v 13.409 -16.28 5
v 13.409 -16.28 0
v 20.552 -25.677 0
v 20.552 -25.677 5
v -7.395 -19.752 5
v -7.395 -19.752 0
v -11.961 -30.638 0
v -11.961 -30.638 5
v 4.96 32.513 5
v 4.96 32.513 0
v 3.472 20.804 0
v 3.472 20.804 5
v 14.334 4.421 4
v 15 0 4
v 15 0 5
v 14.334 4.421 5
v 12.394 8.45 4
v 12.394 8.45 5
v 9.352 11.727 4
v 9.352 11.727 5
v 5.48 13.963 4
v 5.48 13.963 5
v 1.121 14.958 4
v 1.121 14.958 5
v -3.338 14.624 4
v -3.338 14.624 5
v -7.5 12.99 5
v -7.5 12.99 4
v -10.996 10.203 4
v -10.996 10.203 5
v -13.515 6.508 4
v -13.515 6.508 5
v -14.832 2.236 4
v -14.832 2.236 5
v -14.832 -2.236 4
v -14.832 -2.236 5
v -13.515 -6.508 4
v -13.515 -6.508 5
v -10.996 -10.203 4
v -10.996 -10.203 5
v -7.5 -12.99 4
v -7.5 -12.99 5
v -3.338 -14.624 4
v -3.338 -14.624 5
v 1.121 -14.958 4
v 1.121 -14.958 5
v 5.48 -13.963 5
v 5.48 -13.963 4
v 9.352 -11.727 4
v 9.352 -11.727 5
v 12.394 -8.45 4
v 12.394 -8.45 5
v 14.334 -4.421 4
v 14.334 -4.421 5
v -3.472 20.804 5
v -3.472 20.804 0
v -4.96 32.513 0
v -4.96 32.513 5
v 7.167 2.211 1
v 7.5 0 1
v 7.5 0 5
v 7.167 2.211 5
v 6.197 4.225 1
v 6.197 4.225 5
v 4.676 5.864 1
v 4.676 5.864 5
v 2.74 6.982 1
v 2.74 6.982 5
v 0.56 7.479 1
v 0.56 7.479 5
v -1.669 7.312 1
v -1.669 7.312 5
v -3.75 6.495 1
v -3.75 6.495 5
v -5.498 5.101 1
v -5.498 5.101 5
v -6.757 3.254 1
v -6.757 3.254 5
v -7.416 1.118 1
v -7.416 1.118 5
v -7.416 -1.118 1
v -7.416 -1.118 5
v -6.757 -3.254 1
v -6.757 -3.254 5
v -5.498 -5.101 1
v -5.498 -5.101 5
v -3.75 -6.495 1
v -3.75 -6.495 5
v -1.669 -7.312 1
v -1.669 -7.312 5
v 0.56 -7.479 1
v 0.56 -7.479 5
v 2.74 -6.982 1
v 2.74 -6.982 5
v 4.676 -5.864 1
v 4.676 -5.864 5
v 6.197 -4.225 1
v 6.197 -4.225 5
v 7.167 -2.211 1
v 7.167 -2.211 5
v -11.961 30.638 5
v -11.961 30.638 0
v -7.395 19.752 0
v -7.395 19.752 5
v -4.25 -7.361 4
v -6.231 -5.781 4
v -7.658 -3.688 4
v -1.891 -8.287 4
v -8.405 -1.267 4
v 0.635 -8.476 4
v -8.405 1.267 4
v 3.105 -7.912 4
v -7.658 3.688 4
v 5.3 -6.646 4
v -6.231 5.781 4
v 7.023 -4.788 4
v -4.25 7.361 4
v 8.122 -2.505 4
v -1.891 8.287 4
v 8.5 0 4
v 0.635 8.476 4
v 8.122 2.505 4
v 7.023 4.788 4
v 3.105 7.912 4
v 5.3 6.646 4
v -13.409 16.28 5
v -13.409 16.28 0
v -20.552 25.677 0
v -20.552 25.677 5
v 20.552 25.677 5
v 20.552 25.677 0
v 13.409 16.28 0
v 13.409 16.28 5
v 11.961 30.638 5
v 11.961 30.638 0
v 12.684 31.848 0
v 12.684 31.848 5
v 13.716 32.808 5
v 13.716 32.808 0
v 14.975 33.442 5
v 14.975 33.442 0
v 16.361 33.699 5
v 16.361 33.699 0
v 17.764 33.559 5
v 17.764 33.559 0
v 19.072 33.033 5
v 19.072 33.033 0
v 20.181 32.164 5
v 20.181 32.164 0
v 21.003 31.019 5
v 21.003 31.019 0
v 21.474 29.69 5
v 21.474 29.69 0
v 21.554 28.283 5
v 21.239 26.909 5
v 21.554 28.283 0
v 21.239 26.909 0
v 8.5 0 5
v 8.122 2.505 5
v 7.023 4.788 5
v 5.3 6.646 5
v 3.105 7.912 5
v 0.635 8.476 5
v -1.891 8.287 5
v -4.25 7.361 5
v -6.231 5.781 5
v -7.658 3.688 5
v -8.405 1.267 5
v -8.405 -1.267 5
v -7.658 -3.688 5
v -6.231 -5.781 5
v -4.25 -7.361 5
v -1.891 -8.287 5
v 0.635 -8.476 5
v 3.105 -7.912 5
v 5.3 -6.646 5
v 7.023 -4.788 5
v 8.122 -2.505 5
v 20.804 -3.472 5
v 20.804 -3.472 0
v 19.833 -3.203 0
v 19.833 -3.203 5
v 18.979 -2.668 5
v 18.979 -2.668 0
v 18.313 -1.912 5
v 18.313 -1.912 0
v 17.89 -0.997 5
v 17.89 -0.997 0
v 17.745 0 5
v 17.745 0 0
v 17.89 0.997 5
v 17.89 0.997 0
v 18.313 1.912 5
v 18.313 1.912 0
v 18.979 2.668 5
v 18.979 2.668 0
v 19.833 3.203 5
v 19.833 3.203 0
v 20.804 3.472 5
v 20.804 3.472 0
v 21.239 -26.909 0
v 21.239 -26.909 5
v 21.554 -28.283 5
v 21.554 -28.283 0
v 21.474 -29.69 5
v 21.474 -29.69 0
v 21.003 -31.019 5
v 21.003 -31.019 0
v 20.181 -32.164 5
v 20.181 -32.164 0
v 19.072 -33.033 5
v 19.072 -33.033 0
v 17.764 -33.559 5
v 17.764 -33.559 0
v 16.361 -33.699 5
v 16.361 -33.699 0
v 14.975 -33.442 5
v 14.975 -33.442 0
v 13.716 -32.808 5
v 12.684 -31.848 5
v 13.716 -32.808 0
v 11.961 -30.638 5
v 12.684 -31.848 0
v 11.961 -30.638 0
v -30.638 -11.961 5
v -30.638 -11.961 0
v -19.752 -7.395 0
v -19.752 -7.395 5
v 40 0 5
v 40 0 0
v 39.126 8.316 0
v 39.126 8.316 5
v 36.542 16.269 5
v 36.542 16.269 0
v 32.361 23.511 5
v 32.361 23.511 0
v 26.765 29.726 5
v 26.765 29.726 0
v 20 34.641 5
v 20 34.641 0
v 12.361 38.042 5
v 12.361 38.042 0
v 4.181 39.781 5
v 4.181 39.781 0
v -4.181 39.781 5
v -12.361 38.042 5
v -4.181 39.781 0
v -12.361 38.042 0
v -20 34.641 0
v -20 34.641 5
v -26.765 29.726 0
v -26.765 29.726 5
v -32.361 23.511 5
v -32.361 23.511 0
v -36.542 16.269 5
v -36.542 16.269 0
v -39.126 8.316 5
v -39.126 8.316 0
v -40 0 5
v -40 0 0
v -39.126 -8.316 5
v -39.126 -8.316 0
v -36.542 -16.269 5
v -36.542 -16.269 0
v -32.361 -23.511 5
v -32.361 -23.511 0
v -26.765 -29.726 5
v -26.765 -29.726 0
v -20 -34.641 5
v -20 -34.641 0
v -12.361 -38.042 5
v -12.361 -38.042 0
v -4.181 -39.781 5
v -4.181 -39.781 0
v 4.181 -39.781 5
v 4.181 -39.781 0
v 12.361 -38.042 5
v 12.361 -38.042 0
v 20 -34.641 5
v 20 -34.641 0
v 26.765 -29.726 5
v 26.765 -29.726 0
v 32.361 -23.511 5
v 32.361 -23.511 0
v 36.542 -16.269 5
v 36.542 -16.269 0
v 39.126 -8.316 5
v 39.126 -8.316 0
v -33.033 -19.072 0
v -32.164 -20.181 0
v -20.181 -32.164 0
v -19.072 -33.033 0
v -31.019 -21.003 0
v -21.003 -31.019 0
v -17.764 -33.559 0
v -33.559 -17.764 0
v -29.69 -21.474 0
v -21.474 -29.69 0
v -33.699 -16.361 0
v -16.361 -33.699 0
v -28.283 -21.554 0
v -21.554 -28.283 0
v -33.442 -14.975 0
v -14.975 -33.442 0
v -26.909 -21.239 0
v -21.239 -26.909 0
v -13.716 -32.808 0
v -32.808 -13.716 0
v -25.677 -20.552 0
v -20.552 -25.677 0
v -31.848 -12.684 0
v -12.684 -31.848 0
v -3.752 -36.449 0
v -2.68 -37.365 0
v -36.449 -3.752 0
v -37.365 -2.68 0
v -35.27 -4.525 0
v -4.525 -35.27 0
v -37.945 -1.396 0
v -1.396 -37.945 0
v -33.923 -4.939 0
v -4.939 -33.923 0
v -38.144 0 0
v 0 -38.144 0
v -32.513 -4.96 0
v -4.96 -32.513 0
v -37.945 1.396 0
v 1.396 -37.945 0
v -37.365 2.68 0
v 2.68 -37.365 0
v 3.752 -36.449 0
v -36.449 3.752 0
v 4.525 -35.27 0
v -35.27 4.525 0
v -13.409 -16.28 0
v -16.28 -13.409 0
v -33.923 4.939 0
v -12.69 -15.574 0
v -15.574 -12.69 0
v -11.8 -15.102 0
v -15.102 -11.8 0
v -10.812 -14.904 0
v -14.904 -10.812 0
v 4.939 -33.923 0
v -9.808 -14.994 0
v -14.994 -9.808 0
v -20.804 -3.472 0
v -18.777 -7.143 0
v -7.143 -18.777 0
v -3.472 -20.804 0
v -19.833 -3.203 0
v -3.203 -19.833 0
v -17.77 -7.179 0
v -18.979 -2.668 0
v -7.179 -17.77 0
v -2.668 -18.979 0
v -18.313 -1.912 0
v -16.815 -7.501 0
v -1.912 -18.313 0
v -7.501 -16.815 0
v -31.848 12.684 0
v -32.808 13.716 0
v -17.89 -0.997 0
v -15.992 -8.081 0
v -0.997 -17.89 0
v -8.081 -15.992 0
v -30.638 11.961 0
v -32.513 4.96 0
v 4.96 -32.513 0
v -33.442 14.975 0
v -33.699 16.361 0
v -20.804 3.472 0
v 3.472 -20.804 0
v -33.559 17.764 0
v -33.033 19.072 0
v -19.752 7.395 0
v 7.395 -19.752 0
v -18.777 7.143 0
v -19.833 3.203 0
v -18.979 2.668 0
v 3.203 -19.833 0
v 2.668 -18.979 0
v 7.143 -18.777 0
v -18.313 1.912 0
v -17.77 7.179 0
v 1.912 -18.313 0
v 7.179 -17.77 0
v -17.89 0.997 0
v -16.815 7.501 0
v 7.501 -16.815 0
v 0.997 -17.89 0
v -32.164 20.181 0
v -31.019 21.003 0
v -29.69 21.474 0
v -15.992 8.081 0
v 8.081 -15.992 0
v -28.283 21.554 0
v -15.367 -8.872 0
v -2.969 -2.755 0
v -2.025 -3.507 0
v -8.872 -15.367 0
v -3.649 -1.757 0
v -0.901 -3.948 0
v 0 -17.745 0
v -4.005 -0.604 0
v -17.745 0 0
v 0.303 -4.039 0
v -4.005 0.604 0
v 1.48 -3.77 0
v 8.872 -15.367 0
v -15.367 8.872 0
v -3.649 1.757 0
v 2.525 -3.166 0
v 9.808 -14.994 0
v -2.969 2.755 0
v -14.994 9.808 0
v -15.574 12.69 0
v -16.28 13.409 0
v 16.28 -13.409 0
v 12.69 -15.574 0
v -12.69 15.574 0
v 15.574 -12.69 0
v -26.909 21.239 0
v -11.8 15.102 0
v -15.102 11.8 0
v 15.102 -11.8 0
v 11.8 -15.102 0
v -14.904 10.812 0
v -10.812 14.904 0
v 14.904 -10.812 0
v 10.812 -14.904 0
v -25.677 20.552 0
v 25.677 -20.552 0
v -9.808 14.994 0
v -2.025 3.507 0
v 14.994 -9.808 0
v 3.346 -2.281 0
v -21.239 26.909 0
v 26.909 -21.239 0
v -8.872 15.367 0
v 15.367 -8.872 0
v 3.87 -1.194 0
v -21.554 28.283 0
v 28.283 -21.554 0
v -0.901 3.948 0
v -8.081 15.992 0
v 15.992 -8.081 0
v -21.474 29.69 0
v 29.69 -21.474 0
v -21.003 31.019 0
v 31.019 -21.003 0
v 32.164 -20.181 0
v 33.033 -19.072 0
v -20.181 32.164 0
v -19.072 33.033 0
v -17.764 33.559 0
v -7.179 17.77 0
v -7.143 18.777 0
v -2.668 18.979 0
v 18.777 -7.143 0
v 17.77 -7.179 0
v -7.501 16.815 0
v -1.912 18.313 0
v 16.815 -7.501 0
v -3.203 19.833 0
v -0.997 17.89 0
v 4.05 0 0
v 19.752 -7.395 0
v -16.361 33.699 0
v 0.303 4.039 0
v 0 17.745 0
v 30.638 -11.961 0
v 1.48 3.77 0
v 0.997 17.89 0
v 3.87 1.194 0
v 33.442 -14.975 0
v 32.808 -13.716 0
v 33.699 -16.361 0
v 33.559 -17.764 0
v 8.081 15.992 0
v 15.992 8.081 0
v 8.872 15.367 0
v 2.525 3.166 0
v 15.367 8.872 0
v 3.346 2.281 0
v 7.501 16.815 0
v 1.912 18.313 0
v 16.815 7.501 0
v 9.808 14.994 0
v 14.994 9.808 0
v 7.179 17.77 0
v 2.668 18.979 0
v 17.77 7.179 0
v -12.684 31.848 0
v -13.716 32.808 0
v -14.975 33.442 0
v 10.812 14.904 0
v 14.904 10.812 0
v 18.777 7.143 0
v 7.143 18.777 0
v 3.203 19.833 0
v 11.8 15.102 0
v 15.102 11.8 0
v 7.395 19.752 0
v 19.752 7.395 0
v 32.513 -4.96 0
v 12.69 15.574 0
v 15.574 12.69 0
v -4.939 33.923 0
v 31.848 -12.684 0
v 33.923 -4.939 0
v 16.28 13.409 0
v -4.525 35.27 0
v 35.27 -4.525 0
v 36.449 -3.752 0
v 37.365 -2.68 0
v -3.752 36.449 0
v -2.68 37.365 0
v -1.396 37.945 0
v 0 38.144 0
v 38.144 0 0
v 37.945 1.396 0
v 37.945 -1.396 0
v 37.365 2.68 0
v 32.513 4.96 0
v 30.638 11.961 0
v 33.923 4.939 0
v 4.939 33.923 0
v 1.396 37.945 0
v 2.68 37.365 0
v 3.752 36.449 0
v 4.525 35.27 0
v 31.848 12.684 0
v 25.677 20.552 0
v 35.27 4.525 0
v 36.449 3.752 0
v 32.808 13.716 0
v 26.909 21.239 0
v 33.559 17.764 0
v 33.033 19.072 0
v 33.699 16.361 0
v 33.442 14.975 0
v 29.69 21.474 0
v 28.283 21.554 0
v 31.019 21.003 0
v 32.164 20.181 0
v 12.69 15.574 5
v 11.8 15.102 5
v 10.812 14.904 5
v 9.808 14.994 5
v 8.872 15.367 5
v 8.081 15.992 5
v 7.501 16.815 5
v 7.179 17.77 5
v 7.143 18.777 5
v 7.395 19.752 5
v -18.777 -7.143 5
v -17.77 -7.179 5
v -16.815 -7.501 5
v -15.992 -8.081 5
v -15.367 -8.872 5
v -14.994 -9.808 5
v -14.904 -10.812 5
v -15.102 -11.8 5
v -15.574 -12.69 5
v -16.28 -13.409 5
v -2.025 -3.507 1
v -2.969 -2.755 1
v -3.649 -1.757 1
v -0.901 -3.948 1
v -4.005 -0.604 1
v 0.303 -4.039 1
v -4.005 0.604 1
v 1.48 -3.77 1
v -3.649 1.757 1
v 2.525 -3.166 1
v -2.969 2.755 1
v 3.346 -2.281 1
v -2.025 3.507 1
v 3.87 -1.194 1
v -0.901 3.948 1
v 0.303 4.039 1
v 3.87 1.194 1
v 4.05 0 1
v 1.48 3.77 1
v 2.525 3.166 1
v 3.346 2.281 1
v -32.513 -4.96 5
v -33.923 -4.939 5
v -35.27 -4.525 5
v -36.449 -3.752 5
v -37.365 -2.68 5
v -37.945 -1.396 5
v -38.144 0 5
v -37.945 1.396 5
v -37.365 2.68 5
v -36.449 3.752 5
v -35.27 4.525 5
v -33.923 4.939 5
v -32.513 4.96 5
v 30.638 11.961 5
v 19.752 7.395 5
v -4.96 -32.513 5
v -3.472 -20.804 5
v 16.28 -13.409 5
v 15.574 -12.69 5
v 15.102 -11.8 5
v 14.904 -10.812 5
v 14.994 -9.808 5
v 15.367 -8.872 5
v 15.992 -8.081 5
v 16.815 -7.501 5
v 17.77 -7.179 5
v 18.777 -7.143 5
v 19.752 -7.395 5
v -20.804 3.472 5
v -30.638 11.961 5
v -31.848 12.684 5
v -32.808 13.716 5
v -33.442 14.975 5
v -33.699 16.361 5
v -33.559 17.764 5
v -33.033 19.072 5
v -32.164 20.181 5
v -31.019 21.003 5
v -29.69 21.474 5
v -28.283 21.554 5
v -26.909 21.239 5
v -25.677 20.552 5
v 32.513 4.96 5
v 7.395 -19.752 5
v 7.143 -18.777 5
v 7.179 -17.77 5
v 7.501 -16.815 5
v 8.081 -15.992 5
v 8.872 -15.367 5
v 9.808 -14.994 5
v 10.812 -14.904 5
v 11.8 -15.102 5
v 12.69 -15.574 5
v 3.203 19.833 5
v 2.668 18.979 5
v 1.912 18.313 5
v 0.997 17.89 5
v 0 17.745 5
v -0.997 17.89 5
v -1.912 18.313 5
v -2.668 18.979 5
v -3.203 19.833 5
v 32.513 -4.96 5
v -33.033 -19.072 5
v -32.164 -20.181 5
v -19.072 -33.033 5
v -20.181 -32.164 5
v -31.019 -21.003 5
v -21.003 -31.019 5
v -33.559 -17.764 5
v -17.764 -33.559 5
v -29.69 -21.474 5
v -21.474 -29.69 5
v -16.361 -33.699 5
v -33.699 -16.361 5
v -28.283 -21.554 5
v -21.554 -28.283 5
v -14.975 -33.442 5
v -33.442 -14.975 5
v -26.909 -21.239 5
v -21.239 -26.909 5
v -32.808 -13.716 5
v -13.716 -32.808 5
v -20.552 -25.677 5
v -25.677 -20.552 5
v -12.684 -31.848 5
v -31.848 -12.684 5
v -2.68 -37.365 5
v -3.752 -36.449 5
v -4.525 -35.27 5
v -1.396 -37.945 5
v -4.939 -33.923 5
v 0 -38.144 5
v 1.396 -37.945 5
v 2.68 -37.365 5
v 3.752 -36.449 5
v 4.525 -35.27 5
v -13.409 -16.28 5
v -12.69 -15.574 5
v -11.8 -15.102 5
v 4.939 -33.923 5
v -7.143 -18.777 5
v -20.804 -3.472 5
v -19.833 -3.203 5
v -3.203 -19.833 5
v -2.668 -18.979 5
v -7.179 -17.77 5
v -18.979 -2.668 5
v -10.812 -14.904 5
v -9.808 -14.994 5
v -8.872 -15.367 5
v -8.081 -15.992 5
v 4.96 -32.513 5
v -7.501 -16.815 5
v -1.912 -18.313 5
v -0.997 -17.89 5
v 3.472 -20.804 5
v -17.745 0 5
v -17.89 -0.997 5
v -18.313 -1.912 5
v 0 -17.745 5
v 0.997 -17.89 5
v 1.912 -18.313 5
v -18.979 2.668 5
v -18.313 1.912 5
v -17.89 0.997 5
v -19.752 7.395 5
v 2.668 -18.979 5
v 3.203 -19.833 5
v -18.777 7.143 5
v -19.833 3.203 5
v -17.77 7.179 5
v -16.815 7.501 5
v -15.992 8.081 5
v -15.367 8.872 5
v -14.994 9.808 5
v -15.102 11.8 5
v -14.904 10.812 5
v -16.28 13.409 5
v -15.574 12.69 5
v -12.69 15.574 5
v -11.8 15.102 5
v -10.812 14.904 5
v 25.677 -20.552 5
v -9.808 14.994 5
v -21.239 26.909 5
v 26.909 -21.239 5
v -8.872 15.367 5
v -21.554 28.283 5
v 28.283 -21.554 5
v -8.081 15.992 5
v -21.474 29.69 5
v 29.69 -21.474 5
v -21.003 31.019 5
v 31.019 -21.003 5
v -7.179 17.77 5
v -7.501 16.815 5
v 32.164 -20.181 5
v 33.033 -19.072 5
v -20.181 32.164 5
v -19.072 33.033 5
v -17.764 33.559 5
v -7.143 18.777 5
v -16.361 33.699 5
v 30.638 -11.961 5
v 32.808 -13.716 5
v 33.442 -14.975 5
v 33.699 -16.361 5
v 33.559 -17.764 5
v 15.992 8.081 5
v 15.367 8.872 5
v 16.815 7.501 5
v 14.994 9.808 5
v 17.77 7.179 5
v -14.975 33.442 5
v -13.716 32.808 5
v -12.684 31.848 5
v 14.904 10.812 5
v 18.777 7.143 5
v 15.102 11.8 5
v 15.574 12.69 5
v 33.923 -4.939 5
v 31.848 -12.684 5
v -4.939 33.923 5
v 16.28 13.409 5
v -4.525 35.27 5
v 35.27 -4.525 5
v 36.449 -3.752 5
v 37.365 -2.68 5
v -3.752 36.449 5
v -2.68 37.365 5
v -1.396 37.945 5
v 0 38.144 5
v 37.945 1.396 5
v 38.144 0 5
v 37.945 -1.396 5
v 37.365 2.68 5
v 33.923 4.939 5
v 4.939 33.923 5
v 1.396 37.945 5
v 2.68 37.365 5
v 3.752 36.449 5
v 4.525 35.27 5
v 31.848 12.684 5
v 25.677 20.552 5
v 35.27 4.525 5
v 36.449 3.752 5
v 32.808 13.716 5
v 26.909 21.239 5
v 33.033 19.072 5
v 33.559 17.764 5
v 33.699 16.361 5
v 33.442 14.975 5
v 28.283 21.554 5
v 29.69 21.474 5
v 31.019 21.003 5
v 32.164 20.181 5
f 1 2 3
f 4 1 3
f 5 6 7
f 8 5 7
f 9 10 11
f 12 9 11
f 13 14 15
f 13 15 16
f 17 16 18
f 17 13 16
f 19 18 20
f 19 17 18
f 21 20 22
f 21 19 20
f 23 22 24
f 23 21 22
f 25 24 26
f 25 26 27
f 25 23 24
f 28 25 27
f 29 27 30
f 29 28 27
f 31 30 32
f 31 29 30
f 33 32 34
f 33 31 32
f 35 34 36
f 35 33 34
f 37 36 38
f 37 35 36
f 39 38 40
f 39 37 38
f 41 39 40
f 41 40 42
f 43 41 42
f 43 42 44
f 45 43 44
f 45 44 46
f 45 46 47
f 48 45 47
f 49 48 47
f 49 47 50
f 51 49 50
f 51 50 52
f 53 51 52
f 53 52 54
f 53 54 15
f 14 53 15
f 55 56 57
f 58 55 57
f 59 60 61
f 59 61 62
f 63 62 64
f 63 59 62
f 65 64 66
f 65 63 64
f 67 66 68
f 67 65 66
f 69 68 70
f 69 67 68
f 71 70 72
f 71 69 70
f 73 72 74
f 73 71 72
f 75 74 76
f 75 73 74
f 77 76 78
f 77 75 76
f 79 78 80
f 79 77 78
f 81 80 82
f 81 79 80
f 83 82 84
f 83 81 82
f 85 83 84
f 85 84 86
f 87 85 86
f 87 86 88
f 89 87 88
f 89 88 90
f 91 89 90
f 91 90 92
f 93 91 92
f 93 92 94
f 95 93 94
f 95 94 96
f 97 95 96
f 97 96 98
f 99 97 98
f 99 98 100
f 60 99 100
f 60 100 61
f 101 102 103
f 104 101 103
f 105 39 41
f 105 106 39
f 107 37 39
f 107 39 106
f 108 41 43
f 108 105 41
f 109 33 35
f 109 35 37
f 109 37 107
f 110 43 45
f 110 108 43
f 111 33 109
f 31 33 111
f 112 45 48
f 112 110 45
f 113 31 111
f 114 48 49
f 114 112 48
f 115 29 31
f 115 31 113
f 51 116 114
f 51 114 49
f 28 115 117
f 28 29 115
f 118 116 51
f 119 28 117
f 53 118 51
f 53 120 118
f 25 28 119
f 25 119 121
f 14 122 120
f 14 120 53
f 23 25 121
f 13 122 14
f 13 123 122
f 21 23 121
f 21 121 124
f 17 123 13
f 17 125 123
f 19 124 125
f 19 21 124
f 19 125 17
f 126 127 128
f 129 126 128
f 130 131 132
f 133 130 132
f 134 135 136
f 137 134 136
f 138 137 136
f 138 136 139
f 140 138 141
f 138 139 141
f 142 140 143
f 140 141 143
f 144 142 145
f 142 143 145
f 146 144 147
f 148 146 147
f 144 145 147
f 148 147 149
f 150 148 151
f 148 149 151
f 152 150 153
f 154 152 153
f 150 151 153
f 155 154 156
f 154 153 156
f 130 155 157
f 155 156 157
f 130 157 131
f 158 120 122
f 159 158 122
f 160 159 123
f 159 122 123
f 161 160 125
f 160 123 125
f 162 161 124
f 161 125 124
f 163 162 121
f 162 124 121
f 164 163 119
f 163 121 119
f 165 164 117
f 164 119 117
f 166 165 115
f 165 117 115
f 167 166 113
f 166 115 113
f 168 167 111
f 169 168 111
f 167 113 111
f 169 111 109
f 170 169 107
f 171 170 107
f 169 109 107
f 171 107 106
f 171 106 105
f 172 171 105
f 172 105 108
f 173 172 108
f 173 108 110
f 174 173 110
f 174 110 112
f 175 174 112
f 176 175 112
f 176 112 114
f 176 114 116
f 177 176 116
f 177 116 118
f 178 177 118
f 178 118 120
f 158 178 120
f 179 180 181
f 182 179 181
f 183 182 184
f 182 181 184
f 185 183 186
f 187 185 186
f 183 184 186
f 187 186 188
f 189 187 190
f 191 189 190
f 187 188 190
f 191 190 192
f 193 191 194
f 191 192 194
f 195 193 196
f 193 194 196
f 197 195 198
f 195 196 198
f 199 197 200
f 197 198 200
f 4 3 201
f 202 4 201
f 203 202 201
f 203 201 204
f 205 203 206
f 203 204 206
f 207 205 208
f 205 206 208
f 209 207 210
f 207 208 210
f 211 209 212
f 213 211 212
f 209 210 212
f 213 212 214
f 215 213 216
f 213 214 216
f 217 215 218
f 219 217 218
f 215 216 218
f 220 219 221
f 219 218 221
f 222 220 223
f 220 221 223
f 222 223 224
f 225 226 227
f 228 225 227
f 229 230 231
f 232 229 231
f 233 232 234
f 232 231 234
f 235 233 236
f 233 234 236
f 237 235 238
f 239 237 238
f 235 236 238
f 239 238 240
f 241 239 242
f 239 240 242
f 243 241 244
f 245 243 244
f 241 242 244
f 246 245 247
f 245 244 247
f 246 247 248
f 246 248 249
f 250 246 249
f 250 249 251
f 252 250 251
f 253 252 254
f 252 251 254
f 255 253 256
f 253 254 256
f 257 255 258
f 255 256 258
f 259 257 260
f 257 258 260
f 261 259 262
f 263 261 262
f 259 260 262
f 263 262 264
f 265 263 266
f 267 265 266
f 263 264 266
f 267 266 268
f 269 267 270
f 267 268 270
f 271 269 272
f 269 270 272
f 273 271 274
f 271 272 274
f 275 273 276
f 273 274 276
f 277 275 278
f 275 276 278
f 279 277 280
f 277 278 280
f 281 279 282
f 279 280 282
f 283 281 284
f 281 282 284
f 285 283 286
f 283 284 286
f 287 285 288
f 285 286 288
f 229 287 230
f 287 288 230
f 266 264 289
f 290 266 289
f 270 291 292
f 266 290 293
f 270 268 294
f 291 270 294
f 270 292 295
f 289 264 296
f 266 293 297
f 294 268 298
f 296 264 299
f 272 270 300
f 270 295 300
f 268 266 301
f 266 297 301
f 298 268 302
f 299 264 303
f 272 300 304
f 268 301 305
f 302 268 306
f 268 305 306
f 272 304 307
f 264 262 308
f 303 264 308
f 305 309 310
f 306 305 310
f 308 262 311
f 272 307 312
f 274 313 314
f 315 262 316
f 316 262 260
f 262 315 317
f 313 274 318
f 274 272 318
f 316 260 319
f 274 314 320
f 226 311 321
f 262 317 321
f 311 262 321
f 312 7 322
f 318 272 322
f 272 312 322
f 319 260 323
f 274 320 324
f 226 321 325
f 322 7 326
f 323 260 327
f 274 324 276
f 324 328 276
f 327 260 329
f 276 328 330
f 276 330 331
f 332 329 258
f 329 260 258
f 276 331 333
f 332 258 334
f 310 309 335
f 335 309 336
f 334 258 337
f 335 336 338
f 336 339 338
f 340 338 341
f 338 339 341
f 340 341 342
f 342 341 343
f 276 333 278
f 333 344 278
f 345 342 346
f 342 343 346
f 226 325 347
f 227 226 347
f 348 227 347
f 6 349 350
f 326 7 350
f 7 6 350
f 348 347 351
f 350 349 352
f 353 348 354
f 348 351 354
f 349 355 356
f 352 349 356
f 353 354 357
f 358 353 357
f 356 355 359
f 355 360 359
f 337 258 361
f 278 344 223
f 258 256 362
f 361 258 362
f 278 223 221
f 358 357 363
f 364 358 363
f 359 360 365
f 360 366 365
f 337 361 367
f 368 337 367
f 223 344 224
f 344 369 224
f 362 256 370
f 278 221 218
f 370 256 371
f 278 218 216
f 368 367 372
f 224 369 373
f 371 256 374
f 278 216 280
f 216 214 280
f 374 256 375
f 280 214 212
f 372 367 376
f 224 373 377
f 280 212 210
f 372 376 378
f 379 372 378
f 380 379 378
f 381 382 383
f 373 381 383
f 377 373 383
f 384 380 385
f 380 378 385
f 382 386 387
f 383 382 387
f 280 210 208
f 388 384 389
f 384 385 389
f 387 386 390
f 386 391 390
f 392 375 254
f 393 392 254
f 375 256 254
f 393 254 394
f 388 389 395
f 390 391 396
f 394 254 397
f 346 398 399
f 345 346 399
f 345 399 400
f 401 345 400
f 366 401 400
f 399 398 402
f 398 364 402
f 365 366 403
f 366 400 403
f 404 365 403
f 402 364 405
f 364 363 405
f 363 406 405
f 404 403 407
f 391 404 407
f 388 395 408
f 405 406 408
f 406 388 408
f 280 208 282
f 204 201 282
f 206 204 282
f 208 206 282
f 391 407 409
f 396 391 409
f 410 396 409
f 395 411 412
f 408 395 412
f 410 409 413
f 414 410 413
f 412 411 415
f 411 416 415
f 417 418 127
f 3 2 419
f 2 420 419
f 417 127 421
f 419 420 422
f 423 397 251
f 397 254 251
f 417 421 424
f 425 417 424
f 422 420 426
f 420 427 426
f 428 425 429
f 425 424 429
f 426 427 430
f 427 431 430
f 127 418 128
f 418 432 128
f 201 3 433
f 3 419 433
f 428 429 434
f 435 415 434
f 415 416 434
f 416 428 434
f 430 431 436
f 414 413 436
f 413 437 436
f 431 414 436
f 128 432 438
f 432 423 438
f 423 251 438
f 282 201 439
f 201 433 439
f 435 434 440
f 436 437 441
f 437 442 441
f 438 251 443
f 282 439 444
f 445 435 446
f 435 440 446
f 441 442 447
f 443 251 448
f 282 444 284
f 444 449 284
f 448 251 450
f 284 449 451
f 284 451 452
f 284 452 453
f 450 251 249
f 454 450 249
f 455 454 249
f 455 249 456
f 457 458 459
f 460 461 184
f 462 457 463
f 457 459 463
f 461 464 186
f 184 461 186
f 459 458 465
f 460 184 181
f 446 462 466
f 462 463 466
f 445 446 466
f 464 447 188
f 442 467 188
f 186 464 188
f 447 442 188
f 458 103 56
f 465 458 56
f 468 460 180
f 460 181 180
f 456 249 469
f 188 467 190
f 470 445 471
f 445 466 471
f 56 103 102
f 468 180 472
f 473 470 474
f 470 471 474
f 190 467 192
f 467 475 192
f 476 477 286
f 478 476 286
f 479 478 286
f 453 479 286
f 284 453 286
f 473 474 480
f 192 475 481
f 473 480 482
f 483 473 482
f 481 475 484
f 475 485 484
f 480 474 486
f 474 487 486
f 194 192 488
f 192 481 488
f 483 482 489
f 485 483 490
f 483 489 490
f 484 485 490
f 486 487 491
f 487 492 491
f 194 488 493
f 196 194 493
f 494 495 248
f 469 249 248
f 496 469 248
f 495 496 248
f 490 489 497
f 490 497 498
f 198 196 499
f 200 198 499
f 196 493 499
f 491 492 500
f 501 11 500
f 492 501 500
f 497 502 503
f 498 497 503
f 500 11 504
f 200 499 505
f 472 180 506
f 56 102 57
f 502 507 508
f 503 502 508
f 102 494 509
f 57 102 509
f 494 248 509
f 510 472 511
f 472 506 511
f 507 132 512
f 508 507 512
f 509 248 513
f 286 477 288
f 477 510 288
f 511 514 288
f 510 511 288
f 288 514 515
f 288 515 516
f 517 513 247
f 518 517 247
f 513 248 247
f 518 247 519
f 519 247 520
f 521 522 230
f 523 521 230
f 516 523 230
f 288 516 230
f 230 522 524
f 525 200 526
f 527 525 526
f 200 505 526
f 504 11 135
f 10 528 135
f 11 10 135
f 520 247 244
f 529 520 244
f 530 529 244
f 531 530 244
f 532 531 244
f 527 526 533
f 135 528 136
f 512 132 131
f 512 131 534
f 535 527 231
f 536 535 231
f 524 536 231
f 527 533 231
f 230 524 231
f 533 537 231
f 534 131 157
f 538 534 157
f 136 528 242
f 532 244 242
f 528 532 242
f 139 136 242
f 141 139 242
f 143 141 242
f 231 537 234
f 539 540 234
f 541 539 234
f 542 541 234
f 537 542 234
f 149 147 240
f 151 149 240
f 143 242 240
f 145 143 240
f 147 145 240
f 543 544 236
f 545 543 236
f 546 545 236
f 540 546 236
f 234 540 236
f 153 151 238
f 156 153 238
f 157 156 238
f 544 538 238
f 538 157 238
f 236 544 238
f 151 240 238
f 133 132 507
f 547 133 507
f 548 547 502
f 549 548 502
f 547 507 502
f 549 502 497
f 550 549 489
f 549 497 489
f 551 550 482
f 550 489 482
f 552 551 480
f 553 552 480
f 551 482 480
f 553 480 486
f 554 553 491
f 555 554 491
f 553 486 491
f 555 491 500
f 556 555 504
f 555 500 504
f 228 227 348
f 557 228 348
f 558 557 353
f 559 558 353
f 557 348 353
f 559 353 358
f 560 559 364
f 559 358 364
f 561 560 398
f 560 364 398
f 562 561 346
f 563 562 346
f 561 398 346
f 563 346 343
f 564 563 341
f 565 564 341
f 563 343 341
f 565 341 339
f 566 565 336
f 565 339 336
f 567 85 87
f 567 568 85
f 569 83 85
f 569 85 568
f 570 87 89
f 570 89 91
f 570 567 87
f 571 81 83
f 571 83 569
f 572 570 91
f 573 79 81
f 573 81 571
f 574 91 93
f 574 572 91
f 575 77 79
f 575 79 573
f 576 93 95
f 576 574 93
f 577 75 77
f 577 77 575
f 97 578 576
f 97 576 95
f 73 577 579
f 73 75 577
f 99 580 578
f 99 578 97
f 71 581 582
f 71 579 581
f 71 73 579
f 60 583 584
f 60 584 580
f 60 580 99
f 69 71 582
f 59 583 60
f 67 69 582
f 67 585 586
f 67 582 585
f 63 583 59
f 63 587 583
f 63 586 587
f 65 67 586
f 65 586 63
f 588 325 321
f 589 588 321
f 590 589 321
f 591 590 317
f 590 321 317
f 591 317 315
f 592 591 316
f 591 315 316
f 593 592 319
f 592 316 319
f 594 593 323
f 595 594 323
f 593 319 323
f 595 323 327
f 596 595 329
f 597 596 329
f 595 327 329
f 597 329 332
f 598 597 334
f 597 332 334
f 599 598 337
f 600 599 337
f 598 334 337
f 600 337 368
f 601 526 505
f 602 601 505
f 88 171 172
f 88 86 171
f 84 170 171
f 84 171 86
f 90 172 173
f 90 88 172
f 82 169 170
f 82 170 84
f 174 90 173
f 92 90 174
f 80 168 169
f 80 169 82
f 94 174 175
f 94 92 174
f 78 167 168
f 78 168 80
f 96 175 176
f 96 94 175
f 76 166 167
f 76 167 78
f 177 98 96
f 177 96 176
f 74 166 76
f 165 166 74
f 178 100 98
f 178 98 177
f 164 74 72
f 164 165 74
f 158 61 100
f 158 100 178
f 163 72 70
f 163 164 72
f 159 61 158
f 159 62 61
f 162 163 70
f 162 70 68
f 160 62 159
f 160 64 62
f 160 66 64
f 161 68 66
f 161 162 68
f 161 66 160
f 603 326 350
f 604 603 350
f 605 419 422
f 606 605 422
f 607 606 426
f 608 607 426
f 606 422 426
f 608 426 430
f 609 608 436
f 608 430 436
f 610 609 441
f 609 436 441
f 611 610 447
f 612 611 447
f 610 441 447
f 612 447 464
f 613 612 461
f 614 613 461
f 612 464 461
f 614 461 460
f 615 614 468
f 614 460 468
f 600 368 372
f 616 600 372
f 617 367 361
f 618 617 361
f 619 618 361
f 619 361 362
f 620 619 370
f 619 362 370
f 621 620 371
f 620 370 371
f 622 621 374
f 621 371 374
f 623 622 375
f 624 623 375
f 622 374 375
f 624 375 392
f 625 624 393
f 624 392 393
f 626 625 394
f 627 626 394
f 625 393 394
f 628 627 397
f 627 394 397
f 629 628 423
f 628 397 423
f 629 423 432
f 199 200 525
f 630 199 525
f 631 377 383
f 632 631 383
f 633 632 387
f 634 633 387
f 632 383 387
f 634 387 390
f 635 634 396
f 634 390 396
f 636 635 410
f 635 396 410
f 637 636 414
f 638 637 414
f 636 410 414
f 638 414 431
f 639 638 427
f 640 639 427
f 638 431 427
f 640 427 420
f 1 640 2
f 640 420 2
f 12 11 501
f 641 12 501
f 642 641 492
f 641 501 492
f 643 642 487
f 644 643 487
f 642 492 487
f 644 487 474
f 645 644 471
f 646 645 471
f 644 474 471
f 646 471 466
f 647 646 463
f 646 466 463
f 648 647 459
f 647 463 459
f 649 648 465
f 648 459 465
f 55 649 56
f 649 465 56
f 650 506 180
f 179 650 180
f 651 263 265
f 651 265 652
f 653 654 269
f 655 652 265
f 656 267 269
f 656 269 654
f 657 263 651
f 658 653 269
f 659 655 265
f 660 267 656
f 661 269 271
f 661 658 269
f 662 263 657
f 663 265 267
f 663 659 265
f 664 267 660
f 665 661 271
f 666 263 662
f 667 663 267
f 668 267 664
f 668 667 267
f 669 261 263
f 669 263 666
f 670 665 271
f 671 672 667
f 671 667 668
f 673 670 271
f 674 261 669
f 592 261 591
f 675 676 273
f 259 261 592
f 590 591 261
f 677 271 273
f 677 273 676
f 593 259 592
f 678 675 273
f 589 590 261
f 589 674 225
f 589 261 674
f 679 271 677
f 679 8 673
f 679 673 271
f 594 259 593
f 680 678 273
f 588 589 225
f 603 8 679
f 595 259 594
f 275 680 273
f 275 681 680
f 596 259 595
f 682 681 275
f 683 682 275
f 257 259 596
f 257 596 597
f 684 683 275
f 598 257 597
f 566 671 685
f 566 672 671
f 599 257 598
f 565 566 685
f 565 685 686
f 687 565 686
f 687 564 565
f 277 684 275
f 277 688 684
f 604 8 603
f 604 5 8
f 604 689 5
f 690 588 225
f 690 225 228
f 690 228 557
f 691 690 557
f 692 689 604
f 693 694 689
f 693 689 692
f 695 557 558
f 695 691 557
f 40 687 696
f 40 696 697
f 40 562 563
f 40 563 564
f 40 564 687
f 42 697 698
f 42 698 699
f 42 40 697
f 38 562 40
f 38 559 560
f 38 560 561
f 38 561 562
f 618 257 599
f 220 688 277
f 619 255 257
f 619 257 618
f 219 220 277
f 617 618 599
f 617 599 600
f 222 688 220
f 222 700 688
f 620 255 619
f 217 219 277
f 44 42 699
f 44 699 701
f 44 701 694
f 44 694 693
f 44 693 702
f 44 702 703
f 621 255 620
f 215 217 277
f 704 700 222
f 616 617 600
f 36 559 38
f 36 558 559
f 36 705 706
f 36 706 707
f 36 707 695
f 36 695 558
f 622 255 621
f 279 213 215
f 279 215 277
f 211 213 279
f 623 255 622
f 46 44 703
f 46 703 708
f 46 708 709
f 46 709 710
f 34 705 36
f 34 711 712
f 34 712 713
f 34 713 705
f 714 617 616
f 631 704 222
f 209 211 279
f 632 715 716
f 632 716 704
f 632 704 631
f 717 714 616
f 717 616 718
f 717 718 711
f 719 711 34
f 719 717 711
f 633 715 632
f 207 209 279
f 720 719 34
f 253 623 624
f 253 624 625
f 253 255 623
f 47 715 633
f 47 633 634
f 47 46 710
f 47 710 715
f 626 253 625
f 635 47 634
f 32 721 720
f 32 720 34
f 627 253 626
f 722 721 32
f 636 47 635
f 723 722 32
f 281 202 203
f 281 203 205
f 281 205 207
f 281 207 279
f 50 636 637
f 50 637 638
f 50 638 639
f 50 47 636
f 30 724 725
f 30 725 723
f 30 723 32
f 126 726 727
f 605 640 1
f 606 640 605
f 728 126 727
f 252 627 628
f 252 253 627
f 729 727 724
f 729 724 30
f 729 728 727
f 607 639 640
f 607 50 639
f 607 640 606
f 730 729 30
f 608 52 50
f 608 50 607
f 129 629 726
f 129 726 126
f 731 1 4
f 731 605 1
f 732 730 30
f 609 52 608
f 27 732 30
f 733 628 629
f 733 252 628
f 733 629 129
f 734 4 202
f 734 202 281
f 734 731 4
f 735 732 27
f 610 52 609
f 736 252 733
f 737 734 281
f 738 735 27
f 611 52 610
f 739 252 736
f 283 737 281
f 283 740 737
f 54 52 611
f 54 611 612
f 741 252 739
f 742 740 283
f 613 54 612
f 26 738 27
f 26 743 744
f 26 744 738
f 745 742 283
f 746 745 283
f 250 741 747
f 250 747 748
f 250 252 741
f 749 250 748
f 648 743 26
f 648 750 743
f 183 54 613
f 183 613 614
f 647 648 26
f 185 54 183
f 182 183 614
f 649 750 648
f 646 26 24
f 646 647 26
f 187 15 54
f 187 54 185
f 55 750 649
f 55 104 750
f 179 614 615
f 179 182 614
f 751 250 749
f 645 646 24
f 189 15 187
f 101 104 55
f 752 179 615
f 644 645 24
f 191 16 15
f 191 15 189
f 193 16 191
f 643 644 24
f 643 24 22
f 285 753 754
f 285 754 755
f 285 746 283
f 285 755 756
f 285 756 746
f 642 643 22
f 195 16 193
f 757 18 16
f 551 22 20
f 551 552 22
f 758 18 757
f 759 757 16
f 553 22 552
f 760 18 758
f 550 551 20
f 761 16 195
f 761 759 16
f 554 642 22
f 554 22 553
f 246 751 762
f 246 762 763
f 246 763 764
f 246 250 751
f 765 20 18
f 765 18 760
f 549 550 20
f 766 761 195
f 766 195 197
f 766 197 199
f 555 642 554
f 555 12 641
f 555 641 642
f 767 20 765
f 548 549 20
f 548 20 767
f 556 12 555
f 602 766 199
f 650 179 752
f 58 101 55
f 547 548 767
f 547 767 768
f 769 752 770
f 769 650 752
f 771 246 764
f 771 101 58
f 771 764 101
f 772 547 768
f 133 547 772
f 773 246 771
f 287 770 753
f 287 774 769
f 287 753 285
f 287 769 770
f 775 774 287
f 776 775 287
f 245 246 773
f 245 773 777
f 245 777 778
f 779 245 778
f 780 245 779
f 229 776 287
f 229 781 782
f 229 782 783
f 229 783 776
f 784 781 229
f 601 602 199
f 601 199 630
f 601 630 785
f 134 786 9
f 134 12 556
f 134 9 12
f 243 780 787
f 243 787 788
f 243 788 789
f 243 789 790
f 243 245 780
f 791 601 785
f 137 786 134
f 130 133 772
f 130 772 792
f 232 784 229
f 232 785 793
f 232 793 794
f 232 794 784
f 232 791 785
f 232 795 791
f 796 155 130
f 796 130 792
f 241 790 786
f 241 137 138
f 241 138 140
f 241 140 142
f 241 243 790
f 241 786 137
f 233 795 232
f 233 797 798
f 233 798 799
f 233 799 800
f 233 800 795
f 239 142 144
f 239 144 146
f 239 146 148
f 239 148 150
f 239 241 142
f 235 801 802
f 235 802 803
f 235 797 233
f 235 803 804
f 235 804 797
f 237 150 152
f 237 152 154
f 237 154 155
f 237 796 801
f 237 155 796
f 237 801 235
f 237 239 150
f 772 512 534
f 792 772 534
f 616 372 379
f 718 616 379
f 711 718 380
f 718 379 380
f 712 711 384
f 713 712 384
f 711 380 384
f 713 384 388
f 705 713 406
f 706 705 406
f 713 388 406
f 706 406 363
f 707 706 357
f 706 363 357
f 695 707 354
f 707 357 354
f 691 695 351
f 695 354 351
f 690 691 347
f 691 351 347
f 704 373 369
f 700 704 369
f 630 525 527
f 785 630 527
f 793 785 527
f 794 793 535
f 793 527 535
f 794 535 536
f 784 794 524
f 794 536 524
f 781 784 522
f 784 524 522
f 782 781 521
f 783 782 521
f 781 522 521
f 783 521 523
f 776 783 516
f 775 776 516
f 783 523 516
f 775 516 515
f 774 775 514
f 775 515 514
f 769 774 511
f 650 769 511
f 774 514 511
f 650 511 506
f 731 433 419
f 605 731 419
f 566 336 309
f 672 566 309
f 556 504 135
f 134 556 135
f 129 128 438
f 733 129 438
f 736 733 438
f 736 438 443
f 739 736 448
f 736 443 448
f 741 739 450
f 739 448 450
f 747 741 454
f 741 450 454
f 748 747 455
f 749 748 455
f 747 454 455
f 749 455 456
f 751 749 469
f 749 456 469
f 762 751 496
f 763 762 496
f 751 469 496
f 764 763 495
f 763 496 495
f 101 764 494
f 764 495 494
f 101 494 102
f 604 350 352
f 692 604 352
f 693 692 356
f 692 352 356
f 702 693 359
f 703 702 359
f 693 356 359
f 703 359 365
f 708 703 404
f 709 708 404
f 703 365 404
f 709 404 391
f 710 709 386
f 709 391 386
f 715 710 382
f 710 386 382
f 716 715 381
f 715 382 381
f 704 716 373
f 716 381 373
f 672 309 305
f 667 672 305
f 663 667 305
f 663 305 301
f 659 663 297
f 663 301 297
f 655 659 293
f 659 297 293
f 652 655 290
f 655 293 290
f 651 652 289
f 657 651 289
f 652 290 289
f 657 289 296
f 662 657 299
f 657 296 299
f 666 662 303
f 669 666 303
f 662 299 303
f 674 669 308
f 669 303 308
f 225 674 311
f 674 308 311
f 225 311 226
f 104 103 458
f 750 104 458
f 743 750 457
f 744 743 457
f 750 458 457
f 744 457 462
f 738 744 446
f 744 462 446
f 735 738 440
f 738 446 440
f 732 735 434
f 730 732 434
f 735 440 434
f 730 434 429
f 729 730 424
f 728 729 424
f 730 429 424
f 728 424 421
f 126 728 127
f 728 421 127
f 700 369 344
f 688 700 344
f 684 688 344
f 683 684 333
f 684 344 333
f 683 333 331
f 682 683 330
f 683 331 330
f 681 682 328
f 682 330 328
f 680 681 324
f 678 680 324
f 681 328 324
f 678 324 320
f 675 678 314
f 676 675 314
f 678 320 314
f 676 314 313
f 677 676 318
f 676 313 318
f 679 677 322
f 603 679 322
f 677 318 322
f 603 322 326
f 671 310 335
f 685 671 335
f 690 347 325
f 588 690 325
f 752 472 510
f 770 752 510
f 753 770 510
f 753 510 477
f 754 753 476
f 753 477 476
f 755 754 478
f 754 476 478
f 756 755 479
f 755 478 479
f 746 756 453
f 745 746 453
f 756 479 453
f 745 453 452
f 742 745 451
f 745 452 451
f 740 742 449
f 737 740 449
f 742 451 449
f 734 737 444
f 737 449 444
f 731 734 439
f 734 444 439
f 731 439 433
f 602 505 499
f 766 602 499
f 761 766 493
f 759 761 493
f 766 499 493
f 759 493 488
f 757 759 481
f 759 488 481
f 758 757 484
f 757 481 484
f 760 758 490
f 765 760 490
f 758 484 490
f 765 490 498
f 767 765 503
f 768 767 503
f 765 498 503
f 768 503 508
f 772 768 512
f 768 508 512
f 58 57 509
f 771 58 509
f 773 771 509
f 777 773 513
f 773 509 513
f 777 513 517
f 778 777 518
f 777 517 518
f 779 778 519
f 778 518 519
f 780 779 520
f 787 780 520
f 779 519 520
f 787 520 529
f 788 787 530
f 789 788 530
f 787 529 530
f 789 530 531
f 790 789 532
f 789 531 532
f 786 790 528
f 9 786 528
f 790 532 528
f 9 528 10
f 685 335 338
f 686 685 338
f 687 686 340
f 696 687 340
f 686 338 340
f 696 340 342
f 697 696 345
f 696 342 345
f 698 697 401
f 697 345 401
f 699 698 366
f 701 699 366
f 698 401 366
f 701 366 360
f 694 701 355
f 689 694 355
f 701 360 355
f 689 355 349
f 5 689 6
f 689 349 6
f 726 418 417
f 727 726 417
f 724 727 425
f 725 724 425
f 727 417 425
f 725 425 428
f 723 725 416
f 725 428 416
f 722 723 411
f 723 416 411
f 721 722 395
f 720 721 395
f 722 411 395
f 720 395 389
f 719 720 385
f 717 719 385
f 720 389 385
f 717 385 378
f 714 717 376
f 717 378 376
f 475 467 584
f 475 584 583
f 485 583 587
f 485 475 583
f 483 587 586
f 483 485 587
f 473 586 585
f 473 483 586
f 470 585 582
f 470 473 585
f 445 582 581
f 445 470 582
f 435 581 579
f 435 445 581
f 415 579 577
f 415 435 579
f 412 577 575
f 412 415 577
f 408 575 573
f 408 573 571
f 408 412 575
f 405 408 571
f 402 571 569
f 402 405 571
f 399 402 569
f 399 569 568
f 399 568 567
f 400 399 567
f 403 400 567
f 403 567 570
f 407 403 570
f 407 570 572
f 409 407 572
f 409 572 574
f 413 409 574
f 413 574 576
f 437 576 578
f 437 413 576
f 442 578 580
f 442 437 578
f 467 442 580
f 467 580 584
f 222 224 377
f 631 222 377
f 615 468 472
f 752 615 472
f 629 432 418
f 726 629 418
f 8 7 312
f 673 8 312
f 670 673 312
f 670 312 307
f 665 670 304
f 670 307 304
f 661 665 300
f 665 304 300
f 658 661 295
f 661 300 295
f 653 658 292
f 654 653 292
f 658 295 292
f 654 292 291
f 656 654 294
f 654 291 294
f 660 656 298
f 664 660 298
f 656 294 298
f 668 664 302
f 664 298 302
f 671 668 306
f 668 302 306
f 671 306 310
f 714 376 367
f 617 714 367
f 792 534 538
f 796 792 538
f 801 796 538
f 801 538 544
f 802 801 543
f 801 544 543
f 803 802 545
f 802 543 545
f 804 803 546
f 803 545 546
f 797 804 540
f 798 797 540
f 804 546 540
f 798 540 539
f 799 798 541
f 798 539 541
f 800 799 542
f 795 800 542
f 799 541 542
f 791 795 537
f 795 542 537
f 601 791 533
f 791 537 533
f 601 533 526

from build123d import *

# Parameters (mm, degrees)
F0_R     = 40
F0_R_2   = 15
F1_DEPTH = 5
F0_R_3   = 8.5
F2_DEPTH = 4
F0_R_4   = 7.5
F3_DEPTH = 5
F0_R_5   = 4.05
F4_DEPTH = 1


with BuildPart() as f1:
    # F0 (on Top) → F1 (new body)
    with BuildSketch(Plane.XY):
        Circle(F0_R)
        with BuildLine():
            ThreePointArc((-11.961144, -30.637533), (-19.071879, -33.033464), (-20.55231, -25.677421))
            Line((-20.55231, -25.677421), (-13.40868, -16.280358))
            ThreePointArc((-13.40868, -16.280358), (-8.872378, -15.36741), (-7.394863, -19.752436))
            Line((-7.394863, -19.752436), (-11.961144, -30.637533))
        make_face(mode=Mode.SUBTRACT)
        with BuildLine():
            ThreePointArc((4.960112, -32.513454), (0, -38.143759), (-4.960112, -32.513454))
            Line((-4.960112, -32.513454), (-3.472079, -20.803543))
            ThreePointArc((-3.472079, -20.803543), (0, -17.744757), (3.472079, -20.803543))
            Line((3.472079, -20.803543), (4.960112, -32.513454))
        make_face(mode=Mode.SUBTRACT)
        with BuildLine():
            ThreePointArc((-25.677421, -20.55231), (-33.033464, -19.071879), (-30.637533, -11.961144))
            Line((-30.637533, -11.961144), (-19.752436, -7.394863))
            ThreePointArc((-19.752436, -7.394863), (-15.36741, -8.872378), (-16.280358, -13.40868))
            Line((-16.280358, -13.40868), (-25.677421, -20.55231))
        make_face(mode=Mode.SUBTRACT)
        with BuildLine():
            ThreePointArc((20.55231, -25.677421), (19.071879, -33.033464), (11.961144, -30.637533))
            Line((11.961144, -30.637533), (7.394863, -19.752436))
            ThreePointArc((7.394863, -19.752436), (8.872378, -15.36741), (13.40868, -16.280358))
            Line((13.40868, -16.280358), (20.55231, -25.677421))
        make_face(mode=Mode.SUBTRACT)
        with BuildLine():
            ThreePointArc((30.637533, -11.961144), (33.033464, -19.071879), (25.677421, -20.55231))
            Line((25.677421, -20.55231), (16.280358, -13.40868))
            ThreePointArc((16.280358, -13.40868), (15.36741, -8.872378), (19.752436, -7.394863))
            Line((19.752436, -7.394863), (30.637533, -11.961144))
        make_face(mode=Mode.SUBTRACT)
        with BuildLine():
            ThreePointArc((32.513454, 4.960112), (38.143759, 0), (32.513454, -4.960112))
            Line((32.513454, -4.960112), (20.803543, -3.472079))
            ThreePointArc((20.803543, -3.472079), (17.744757, 0), (20.803543, 3.472079))
            Line((20.803543, 3.472079), (32.513454, 4.960112))
        make_face(mode=Mode.SUBTRACT)
        with BuildLine():
            ThreePointArc((-32.513454, -4.960112), (-38.143759, 0), (-32.513454, 4.960112))
            Line((-32.513454, 4.960112), (-20.803543, 3.472079))
            ThreePointArc((-20.803543, 3.472079), (-17.744757, 0), (-20.803543, -3.472079))
            Line((-20.803543, -3.472079), (-32.513454, -4.960112))
        make_face(mode=Mode.SUBTRACT)
        with BuildLine():
            ThreePointArc((-30.637533, 11.961144), (-33.033464, 19.071879), (-25.677421, 20.55231))
            Line((-25.677421, 20.55231), (-16.280358, 13.40868))
            ThreePointArc((-16.280358, 13.40868), (-15.36741, 8.872378), (-19.752436, 7.394863))
            Line((-19.752436, 7.394863), (-30.637533, 11.961144))
        make_face(mode=Mode.SUBTRACT)
        with BuildLine():
            ThreePointArc((-20.55231, 25.677421), (-19.071879, 33.033464), (-11.961144, 30.637533))
            Line((-11.961144, 30.637533), (-7.394863, 19.752436))
            ThreePointArc((-7.394863, 19.752436), (-8.872378, 15.36741), (-13.40868, 16.280358))
            Line((-13.40868, 16.280358), (-20.55231, 25.677421))
        make_face(mode=Mode.SUBTRACT)
        Circle(F0_R_2, mode=Mode.SUBTRACT)
        with BuildLine():
            ThreePointArc((25.677421, 20.55231), (33.033464, 19.071879), (30.637533, 11.961144))
            Line((30.637533, 11.961144), (19.752436, 7.394863))
            ThreePointArc((19.752436, 7.394863), (15.36741, 8.872378), (16.280358, 13.40868))
            Line((16.280358, 13.40868), (25.677421, 20.55231))
        make_face(mode=Mode.SUBTRACT)
        with BuildLine():
            ThreePointArc((3.472079, 20.803543), (0, 17.744757), (-3.472079, 20.803543))
            Line((-3.472079, 20.803543), (-4.960112, 32.513454))
            ThreePointArc((-4.960112, 32.513454), (0, 38.143759), (4.960112, 32.513454))
            Line((4.960112, 32.513454), (3.472079, 20.803543))
        make_face(mode=Mode.SUBTRACT)
        with BuildLine():
            ThreePointArc((11.961144, 30.637533), (19.071879, 33.033464), (20.55231, 25.677421))
            Line((20.55231, 25.677421), (13.40868, 16.280358))
            ThreePointArc((13.40868, 16.280358), (8.872378, 15.36741), (7.394863, 19.752436))
            Line((7.394863, 19.752436), (11.961144, 30.637533))
        make_face(mode=Mode.SUBTRACT)
    extrude(amount=F1_DEPTH)

    # F0 (on Top) → F2 (join)
    with BuildSketch(Plane.XY):
        Circle(F0_R_2)
        Circle(F0_R_3, mode=Mode.SUBTRACT)
    extrude(amount=F2_DEPTH)

    # F0 (on Top) → F3 (join)
    with BuildSketch(Plane.XY):
        Circle(F0_R_3)
        Circle(F0_R_4, mode=Mode.SUBTRACT)
    extrude(amount=F3_DEPTH)

    # F0 (on Top) → F4 (join)
    with BuildSketch(Plane.XY):
        Circle(F0_R_4)
        Circle(F0_R_5, mode=Mode.SUBTRACT)
    extrude(amount=F4_DEPTH)


solid = f1.part
